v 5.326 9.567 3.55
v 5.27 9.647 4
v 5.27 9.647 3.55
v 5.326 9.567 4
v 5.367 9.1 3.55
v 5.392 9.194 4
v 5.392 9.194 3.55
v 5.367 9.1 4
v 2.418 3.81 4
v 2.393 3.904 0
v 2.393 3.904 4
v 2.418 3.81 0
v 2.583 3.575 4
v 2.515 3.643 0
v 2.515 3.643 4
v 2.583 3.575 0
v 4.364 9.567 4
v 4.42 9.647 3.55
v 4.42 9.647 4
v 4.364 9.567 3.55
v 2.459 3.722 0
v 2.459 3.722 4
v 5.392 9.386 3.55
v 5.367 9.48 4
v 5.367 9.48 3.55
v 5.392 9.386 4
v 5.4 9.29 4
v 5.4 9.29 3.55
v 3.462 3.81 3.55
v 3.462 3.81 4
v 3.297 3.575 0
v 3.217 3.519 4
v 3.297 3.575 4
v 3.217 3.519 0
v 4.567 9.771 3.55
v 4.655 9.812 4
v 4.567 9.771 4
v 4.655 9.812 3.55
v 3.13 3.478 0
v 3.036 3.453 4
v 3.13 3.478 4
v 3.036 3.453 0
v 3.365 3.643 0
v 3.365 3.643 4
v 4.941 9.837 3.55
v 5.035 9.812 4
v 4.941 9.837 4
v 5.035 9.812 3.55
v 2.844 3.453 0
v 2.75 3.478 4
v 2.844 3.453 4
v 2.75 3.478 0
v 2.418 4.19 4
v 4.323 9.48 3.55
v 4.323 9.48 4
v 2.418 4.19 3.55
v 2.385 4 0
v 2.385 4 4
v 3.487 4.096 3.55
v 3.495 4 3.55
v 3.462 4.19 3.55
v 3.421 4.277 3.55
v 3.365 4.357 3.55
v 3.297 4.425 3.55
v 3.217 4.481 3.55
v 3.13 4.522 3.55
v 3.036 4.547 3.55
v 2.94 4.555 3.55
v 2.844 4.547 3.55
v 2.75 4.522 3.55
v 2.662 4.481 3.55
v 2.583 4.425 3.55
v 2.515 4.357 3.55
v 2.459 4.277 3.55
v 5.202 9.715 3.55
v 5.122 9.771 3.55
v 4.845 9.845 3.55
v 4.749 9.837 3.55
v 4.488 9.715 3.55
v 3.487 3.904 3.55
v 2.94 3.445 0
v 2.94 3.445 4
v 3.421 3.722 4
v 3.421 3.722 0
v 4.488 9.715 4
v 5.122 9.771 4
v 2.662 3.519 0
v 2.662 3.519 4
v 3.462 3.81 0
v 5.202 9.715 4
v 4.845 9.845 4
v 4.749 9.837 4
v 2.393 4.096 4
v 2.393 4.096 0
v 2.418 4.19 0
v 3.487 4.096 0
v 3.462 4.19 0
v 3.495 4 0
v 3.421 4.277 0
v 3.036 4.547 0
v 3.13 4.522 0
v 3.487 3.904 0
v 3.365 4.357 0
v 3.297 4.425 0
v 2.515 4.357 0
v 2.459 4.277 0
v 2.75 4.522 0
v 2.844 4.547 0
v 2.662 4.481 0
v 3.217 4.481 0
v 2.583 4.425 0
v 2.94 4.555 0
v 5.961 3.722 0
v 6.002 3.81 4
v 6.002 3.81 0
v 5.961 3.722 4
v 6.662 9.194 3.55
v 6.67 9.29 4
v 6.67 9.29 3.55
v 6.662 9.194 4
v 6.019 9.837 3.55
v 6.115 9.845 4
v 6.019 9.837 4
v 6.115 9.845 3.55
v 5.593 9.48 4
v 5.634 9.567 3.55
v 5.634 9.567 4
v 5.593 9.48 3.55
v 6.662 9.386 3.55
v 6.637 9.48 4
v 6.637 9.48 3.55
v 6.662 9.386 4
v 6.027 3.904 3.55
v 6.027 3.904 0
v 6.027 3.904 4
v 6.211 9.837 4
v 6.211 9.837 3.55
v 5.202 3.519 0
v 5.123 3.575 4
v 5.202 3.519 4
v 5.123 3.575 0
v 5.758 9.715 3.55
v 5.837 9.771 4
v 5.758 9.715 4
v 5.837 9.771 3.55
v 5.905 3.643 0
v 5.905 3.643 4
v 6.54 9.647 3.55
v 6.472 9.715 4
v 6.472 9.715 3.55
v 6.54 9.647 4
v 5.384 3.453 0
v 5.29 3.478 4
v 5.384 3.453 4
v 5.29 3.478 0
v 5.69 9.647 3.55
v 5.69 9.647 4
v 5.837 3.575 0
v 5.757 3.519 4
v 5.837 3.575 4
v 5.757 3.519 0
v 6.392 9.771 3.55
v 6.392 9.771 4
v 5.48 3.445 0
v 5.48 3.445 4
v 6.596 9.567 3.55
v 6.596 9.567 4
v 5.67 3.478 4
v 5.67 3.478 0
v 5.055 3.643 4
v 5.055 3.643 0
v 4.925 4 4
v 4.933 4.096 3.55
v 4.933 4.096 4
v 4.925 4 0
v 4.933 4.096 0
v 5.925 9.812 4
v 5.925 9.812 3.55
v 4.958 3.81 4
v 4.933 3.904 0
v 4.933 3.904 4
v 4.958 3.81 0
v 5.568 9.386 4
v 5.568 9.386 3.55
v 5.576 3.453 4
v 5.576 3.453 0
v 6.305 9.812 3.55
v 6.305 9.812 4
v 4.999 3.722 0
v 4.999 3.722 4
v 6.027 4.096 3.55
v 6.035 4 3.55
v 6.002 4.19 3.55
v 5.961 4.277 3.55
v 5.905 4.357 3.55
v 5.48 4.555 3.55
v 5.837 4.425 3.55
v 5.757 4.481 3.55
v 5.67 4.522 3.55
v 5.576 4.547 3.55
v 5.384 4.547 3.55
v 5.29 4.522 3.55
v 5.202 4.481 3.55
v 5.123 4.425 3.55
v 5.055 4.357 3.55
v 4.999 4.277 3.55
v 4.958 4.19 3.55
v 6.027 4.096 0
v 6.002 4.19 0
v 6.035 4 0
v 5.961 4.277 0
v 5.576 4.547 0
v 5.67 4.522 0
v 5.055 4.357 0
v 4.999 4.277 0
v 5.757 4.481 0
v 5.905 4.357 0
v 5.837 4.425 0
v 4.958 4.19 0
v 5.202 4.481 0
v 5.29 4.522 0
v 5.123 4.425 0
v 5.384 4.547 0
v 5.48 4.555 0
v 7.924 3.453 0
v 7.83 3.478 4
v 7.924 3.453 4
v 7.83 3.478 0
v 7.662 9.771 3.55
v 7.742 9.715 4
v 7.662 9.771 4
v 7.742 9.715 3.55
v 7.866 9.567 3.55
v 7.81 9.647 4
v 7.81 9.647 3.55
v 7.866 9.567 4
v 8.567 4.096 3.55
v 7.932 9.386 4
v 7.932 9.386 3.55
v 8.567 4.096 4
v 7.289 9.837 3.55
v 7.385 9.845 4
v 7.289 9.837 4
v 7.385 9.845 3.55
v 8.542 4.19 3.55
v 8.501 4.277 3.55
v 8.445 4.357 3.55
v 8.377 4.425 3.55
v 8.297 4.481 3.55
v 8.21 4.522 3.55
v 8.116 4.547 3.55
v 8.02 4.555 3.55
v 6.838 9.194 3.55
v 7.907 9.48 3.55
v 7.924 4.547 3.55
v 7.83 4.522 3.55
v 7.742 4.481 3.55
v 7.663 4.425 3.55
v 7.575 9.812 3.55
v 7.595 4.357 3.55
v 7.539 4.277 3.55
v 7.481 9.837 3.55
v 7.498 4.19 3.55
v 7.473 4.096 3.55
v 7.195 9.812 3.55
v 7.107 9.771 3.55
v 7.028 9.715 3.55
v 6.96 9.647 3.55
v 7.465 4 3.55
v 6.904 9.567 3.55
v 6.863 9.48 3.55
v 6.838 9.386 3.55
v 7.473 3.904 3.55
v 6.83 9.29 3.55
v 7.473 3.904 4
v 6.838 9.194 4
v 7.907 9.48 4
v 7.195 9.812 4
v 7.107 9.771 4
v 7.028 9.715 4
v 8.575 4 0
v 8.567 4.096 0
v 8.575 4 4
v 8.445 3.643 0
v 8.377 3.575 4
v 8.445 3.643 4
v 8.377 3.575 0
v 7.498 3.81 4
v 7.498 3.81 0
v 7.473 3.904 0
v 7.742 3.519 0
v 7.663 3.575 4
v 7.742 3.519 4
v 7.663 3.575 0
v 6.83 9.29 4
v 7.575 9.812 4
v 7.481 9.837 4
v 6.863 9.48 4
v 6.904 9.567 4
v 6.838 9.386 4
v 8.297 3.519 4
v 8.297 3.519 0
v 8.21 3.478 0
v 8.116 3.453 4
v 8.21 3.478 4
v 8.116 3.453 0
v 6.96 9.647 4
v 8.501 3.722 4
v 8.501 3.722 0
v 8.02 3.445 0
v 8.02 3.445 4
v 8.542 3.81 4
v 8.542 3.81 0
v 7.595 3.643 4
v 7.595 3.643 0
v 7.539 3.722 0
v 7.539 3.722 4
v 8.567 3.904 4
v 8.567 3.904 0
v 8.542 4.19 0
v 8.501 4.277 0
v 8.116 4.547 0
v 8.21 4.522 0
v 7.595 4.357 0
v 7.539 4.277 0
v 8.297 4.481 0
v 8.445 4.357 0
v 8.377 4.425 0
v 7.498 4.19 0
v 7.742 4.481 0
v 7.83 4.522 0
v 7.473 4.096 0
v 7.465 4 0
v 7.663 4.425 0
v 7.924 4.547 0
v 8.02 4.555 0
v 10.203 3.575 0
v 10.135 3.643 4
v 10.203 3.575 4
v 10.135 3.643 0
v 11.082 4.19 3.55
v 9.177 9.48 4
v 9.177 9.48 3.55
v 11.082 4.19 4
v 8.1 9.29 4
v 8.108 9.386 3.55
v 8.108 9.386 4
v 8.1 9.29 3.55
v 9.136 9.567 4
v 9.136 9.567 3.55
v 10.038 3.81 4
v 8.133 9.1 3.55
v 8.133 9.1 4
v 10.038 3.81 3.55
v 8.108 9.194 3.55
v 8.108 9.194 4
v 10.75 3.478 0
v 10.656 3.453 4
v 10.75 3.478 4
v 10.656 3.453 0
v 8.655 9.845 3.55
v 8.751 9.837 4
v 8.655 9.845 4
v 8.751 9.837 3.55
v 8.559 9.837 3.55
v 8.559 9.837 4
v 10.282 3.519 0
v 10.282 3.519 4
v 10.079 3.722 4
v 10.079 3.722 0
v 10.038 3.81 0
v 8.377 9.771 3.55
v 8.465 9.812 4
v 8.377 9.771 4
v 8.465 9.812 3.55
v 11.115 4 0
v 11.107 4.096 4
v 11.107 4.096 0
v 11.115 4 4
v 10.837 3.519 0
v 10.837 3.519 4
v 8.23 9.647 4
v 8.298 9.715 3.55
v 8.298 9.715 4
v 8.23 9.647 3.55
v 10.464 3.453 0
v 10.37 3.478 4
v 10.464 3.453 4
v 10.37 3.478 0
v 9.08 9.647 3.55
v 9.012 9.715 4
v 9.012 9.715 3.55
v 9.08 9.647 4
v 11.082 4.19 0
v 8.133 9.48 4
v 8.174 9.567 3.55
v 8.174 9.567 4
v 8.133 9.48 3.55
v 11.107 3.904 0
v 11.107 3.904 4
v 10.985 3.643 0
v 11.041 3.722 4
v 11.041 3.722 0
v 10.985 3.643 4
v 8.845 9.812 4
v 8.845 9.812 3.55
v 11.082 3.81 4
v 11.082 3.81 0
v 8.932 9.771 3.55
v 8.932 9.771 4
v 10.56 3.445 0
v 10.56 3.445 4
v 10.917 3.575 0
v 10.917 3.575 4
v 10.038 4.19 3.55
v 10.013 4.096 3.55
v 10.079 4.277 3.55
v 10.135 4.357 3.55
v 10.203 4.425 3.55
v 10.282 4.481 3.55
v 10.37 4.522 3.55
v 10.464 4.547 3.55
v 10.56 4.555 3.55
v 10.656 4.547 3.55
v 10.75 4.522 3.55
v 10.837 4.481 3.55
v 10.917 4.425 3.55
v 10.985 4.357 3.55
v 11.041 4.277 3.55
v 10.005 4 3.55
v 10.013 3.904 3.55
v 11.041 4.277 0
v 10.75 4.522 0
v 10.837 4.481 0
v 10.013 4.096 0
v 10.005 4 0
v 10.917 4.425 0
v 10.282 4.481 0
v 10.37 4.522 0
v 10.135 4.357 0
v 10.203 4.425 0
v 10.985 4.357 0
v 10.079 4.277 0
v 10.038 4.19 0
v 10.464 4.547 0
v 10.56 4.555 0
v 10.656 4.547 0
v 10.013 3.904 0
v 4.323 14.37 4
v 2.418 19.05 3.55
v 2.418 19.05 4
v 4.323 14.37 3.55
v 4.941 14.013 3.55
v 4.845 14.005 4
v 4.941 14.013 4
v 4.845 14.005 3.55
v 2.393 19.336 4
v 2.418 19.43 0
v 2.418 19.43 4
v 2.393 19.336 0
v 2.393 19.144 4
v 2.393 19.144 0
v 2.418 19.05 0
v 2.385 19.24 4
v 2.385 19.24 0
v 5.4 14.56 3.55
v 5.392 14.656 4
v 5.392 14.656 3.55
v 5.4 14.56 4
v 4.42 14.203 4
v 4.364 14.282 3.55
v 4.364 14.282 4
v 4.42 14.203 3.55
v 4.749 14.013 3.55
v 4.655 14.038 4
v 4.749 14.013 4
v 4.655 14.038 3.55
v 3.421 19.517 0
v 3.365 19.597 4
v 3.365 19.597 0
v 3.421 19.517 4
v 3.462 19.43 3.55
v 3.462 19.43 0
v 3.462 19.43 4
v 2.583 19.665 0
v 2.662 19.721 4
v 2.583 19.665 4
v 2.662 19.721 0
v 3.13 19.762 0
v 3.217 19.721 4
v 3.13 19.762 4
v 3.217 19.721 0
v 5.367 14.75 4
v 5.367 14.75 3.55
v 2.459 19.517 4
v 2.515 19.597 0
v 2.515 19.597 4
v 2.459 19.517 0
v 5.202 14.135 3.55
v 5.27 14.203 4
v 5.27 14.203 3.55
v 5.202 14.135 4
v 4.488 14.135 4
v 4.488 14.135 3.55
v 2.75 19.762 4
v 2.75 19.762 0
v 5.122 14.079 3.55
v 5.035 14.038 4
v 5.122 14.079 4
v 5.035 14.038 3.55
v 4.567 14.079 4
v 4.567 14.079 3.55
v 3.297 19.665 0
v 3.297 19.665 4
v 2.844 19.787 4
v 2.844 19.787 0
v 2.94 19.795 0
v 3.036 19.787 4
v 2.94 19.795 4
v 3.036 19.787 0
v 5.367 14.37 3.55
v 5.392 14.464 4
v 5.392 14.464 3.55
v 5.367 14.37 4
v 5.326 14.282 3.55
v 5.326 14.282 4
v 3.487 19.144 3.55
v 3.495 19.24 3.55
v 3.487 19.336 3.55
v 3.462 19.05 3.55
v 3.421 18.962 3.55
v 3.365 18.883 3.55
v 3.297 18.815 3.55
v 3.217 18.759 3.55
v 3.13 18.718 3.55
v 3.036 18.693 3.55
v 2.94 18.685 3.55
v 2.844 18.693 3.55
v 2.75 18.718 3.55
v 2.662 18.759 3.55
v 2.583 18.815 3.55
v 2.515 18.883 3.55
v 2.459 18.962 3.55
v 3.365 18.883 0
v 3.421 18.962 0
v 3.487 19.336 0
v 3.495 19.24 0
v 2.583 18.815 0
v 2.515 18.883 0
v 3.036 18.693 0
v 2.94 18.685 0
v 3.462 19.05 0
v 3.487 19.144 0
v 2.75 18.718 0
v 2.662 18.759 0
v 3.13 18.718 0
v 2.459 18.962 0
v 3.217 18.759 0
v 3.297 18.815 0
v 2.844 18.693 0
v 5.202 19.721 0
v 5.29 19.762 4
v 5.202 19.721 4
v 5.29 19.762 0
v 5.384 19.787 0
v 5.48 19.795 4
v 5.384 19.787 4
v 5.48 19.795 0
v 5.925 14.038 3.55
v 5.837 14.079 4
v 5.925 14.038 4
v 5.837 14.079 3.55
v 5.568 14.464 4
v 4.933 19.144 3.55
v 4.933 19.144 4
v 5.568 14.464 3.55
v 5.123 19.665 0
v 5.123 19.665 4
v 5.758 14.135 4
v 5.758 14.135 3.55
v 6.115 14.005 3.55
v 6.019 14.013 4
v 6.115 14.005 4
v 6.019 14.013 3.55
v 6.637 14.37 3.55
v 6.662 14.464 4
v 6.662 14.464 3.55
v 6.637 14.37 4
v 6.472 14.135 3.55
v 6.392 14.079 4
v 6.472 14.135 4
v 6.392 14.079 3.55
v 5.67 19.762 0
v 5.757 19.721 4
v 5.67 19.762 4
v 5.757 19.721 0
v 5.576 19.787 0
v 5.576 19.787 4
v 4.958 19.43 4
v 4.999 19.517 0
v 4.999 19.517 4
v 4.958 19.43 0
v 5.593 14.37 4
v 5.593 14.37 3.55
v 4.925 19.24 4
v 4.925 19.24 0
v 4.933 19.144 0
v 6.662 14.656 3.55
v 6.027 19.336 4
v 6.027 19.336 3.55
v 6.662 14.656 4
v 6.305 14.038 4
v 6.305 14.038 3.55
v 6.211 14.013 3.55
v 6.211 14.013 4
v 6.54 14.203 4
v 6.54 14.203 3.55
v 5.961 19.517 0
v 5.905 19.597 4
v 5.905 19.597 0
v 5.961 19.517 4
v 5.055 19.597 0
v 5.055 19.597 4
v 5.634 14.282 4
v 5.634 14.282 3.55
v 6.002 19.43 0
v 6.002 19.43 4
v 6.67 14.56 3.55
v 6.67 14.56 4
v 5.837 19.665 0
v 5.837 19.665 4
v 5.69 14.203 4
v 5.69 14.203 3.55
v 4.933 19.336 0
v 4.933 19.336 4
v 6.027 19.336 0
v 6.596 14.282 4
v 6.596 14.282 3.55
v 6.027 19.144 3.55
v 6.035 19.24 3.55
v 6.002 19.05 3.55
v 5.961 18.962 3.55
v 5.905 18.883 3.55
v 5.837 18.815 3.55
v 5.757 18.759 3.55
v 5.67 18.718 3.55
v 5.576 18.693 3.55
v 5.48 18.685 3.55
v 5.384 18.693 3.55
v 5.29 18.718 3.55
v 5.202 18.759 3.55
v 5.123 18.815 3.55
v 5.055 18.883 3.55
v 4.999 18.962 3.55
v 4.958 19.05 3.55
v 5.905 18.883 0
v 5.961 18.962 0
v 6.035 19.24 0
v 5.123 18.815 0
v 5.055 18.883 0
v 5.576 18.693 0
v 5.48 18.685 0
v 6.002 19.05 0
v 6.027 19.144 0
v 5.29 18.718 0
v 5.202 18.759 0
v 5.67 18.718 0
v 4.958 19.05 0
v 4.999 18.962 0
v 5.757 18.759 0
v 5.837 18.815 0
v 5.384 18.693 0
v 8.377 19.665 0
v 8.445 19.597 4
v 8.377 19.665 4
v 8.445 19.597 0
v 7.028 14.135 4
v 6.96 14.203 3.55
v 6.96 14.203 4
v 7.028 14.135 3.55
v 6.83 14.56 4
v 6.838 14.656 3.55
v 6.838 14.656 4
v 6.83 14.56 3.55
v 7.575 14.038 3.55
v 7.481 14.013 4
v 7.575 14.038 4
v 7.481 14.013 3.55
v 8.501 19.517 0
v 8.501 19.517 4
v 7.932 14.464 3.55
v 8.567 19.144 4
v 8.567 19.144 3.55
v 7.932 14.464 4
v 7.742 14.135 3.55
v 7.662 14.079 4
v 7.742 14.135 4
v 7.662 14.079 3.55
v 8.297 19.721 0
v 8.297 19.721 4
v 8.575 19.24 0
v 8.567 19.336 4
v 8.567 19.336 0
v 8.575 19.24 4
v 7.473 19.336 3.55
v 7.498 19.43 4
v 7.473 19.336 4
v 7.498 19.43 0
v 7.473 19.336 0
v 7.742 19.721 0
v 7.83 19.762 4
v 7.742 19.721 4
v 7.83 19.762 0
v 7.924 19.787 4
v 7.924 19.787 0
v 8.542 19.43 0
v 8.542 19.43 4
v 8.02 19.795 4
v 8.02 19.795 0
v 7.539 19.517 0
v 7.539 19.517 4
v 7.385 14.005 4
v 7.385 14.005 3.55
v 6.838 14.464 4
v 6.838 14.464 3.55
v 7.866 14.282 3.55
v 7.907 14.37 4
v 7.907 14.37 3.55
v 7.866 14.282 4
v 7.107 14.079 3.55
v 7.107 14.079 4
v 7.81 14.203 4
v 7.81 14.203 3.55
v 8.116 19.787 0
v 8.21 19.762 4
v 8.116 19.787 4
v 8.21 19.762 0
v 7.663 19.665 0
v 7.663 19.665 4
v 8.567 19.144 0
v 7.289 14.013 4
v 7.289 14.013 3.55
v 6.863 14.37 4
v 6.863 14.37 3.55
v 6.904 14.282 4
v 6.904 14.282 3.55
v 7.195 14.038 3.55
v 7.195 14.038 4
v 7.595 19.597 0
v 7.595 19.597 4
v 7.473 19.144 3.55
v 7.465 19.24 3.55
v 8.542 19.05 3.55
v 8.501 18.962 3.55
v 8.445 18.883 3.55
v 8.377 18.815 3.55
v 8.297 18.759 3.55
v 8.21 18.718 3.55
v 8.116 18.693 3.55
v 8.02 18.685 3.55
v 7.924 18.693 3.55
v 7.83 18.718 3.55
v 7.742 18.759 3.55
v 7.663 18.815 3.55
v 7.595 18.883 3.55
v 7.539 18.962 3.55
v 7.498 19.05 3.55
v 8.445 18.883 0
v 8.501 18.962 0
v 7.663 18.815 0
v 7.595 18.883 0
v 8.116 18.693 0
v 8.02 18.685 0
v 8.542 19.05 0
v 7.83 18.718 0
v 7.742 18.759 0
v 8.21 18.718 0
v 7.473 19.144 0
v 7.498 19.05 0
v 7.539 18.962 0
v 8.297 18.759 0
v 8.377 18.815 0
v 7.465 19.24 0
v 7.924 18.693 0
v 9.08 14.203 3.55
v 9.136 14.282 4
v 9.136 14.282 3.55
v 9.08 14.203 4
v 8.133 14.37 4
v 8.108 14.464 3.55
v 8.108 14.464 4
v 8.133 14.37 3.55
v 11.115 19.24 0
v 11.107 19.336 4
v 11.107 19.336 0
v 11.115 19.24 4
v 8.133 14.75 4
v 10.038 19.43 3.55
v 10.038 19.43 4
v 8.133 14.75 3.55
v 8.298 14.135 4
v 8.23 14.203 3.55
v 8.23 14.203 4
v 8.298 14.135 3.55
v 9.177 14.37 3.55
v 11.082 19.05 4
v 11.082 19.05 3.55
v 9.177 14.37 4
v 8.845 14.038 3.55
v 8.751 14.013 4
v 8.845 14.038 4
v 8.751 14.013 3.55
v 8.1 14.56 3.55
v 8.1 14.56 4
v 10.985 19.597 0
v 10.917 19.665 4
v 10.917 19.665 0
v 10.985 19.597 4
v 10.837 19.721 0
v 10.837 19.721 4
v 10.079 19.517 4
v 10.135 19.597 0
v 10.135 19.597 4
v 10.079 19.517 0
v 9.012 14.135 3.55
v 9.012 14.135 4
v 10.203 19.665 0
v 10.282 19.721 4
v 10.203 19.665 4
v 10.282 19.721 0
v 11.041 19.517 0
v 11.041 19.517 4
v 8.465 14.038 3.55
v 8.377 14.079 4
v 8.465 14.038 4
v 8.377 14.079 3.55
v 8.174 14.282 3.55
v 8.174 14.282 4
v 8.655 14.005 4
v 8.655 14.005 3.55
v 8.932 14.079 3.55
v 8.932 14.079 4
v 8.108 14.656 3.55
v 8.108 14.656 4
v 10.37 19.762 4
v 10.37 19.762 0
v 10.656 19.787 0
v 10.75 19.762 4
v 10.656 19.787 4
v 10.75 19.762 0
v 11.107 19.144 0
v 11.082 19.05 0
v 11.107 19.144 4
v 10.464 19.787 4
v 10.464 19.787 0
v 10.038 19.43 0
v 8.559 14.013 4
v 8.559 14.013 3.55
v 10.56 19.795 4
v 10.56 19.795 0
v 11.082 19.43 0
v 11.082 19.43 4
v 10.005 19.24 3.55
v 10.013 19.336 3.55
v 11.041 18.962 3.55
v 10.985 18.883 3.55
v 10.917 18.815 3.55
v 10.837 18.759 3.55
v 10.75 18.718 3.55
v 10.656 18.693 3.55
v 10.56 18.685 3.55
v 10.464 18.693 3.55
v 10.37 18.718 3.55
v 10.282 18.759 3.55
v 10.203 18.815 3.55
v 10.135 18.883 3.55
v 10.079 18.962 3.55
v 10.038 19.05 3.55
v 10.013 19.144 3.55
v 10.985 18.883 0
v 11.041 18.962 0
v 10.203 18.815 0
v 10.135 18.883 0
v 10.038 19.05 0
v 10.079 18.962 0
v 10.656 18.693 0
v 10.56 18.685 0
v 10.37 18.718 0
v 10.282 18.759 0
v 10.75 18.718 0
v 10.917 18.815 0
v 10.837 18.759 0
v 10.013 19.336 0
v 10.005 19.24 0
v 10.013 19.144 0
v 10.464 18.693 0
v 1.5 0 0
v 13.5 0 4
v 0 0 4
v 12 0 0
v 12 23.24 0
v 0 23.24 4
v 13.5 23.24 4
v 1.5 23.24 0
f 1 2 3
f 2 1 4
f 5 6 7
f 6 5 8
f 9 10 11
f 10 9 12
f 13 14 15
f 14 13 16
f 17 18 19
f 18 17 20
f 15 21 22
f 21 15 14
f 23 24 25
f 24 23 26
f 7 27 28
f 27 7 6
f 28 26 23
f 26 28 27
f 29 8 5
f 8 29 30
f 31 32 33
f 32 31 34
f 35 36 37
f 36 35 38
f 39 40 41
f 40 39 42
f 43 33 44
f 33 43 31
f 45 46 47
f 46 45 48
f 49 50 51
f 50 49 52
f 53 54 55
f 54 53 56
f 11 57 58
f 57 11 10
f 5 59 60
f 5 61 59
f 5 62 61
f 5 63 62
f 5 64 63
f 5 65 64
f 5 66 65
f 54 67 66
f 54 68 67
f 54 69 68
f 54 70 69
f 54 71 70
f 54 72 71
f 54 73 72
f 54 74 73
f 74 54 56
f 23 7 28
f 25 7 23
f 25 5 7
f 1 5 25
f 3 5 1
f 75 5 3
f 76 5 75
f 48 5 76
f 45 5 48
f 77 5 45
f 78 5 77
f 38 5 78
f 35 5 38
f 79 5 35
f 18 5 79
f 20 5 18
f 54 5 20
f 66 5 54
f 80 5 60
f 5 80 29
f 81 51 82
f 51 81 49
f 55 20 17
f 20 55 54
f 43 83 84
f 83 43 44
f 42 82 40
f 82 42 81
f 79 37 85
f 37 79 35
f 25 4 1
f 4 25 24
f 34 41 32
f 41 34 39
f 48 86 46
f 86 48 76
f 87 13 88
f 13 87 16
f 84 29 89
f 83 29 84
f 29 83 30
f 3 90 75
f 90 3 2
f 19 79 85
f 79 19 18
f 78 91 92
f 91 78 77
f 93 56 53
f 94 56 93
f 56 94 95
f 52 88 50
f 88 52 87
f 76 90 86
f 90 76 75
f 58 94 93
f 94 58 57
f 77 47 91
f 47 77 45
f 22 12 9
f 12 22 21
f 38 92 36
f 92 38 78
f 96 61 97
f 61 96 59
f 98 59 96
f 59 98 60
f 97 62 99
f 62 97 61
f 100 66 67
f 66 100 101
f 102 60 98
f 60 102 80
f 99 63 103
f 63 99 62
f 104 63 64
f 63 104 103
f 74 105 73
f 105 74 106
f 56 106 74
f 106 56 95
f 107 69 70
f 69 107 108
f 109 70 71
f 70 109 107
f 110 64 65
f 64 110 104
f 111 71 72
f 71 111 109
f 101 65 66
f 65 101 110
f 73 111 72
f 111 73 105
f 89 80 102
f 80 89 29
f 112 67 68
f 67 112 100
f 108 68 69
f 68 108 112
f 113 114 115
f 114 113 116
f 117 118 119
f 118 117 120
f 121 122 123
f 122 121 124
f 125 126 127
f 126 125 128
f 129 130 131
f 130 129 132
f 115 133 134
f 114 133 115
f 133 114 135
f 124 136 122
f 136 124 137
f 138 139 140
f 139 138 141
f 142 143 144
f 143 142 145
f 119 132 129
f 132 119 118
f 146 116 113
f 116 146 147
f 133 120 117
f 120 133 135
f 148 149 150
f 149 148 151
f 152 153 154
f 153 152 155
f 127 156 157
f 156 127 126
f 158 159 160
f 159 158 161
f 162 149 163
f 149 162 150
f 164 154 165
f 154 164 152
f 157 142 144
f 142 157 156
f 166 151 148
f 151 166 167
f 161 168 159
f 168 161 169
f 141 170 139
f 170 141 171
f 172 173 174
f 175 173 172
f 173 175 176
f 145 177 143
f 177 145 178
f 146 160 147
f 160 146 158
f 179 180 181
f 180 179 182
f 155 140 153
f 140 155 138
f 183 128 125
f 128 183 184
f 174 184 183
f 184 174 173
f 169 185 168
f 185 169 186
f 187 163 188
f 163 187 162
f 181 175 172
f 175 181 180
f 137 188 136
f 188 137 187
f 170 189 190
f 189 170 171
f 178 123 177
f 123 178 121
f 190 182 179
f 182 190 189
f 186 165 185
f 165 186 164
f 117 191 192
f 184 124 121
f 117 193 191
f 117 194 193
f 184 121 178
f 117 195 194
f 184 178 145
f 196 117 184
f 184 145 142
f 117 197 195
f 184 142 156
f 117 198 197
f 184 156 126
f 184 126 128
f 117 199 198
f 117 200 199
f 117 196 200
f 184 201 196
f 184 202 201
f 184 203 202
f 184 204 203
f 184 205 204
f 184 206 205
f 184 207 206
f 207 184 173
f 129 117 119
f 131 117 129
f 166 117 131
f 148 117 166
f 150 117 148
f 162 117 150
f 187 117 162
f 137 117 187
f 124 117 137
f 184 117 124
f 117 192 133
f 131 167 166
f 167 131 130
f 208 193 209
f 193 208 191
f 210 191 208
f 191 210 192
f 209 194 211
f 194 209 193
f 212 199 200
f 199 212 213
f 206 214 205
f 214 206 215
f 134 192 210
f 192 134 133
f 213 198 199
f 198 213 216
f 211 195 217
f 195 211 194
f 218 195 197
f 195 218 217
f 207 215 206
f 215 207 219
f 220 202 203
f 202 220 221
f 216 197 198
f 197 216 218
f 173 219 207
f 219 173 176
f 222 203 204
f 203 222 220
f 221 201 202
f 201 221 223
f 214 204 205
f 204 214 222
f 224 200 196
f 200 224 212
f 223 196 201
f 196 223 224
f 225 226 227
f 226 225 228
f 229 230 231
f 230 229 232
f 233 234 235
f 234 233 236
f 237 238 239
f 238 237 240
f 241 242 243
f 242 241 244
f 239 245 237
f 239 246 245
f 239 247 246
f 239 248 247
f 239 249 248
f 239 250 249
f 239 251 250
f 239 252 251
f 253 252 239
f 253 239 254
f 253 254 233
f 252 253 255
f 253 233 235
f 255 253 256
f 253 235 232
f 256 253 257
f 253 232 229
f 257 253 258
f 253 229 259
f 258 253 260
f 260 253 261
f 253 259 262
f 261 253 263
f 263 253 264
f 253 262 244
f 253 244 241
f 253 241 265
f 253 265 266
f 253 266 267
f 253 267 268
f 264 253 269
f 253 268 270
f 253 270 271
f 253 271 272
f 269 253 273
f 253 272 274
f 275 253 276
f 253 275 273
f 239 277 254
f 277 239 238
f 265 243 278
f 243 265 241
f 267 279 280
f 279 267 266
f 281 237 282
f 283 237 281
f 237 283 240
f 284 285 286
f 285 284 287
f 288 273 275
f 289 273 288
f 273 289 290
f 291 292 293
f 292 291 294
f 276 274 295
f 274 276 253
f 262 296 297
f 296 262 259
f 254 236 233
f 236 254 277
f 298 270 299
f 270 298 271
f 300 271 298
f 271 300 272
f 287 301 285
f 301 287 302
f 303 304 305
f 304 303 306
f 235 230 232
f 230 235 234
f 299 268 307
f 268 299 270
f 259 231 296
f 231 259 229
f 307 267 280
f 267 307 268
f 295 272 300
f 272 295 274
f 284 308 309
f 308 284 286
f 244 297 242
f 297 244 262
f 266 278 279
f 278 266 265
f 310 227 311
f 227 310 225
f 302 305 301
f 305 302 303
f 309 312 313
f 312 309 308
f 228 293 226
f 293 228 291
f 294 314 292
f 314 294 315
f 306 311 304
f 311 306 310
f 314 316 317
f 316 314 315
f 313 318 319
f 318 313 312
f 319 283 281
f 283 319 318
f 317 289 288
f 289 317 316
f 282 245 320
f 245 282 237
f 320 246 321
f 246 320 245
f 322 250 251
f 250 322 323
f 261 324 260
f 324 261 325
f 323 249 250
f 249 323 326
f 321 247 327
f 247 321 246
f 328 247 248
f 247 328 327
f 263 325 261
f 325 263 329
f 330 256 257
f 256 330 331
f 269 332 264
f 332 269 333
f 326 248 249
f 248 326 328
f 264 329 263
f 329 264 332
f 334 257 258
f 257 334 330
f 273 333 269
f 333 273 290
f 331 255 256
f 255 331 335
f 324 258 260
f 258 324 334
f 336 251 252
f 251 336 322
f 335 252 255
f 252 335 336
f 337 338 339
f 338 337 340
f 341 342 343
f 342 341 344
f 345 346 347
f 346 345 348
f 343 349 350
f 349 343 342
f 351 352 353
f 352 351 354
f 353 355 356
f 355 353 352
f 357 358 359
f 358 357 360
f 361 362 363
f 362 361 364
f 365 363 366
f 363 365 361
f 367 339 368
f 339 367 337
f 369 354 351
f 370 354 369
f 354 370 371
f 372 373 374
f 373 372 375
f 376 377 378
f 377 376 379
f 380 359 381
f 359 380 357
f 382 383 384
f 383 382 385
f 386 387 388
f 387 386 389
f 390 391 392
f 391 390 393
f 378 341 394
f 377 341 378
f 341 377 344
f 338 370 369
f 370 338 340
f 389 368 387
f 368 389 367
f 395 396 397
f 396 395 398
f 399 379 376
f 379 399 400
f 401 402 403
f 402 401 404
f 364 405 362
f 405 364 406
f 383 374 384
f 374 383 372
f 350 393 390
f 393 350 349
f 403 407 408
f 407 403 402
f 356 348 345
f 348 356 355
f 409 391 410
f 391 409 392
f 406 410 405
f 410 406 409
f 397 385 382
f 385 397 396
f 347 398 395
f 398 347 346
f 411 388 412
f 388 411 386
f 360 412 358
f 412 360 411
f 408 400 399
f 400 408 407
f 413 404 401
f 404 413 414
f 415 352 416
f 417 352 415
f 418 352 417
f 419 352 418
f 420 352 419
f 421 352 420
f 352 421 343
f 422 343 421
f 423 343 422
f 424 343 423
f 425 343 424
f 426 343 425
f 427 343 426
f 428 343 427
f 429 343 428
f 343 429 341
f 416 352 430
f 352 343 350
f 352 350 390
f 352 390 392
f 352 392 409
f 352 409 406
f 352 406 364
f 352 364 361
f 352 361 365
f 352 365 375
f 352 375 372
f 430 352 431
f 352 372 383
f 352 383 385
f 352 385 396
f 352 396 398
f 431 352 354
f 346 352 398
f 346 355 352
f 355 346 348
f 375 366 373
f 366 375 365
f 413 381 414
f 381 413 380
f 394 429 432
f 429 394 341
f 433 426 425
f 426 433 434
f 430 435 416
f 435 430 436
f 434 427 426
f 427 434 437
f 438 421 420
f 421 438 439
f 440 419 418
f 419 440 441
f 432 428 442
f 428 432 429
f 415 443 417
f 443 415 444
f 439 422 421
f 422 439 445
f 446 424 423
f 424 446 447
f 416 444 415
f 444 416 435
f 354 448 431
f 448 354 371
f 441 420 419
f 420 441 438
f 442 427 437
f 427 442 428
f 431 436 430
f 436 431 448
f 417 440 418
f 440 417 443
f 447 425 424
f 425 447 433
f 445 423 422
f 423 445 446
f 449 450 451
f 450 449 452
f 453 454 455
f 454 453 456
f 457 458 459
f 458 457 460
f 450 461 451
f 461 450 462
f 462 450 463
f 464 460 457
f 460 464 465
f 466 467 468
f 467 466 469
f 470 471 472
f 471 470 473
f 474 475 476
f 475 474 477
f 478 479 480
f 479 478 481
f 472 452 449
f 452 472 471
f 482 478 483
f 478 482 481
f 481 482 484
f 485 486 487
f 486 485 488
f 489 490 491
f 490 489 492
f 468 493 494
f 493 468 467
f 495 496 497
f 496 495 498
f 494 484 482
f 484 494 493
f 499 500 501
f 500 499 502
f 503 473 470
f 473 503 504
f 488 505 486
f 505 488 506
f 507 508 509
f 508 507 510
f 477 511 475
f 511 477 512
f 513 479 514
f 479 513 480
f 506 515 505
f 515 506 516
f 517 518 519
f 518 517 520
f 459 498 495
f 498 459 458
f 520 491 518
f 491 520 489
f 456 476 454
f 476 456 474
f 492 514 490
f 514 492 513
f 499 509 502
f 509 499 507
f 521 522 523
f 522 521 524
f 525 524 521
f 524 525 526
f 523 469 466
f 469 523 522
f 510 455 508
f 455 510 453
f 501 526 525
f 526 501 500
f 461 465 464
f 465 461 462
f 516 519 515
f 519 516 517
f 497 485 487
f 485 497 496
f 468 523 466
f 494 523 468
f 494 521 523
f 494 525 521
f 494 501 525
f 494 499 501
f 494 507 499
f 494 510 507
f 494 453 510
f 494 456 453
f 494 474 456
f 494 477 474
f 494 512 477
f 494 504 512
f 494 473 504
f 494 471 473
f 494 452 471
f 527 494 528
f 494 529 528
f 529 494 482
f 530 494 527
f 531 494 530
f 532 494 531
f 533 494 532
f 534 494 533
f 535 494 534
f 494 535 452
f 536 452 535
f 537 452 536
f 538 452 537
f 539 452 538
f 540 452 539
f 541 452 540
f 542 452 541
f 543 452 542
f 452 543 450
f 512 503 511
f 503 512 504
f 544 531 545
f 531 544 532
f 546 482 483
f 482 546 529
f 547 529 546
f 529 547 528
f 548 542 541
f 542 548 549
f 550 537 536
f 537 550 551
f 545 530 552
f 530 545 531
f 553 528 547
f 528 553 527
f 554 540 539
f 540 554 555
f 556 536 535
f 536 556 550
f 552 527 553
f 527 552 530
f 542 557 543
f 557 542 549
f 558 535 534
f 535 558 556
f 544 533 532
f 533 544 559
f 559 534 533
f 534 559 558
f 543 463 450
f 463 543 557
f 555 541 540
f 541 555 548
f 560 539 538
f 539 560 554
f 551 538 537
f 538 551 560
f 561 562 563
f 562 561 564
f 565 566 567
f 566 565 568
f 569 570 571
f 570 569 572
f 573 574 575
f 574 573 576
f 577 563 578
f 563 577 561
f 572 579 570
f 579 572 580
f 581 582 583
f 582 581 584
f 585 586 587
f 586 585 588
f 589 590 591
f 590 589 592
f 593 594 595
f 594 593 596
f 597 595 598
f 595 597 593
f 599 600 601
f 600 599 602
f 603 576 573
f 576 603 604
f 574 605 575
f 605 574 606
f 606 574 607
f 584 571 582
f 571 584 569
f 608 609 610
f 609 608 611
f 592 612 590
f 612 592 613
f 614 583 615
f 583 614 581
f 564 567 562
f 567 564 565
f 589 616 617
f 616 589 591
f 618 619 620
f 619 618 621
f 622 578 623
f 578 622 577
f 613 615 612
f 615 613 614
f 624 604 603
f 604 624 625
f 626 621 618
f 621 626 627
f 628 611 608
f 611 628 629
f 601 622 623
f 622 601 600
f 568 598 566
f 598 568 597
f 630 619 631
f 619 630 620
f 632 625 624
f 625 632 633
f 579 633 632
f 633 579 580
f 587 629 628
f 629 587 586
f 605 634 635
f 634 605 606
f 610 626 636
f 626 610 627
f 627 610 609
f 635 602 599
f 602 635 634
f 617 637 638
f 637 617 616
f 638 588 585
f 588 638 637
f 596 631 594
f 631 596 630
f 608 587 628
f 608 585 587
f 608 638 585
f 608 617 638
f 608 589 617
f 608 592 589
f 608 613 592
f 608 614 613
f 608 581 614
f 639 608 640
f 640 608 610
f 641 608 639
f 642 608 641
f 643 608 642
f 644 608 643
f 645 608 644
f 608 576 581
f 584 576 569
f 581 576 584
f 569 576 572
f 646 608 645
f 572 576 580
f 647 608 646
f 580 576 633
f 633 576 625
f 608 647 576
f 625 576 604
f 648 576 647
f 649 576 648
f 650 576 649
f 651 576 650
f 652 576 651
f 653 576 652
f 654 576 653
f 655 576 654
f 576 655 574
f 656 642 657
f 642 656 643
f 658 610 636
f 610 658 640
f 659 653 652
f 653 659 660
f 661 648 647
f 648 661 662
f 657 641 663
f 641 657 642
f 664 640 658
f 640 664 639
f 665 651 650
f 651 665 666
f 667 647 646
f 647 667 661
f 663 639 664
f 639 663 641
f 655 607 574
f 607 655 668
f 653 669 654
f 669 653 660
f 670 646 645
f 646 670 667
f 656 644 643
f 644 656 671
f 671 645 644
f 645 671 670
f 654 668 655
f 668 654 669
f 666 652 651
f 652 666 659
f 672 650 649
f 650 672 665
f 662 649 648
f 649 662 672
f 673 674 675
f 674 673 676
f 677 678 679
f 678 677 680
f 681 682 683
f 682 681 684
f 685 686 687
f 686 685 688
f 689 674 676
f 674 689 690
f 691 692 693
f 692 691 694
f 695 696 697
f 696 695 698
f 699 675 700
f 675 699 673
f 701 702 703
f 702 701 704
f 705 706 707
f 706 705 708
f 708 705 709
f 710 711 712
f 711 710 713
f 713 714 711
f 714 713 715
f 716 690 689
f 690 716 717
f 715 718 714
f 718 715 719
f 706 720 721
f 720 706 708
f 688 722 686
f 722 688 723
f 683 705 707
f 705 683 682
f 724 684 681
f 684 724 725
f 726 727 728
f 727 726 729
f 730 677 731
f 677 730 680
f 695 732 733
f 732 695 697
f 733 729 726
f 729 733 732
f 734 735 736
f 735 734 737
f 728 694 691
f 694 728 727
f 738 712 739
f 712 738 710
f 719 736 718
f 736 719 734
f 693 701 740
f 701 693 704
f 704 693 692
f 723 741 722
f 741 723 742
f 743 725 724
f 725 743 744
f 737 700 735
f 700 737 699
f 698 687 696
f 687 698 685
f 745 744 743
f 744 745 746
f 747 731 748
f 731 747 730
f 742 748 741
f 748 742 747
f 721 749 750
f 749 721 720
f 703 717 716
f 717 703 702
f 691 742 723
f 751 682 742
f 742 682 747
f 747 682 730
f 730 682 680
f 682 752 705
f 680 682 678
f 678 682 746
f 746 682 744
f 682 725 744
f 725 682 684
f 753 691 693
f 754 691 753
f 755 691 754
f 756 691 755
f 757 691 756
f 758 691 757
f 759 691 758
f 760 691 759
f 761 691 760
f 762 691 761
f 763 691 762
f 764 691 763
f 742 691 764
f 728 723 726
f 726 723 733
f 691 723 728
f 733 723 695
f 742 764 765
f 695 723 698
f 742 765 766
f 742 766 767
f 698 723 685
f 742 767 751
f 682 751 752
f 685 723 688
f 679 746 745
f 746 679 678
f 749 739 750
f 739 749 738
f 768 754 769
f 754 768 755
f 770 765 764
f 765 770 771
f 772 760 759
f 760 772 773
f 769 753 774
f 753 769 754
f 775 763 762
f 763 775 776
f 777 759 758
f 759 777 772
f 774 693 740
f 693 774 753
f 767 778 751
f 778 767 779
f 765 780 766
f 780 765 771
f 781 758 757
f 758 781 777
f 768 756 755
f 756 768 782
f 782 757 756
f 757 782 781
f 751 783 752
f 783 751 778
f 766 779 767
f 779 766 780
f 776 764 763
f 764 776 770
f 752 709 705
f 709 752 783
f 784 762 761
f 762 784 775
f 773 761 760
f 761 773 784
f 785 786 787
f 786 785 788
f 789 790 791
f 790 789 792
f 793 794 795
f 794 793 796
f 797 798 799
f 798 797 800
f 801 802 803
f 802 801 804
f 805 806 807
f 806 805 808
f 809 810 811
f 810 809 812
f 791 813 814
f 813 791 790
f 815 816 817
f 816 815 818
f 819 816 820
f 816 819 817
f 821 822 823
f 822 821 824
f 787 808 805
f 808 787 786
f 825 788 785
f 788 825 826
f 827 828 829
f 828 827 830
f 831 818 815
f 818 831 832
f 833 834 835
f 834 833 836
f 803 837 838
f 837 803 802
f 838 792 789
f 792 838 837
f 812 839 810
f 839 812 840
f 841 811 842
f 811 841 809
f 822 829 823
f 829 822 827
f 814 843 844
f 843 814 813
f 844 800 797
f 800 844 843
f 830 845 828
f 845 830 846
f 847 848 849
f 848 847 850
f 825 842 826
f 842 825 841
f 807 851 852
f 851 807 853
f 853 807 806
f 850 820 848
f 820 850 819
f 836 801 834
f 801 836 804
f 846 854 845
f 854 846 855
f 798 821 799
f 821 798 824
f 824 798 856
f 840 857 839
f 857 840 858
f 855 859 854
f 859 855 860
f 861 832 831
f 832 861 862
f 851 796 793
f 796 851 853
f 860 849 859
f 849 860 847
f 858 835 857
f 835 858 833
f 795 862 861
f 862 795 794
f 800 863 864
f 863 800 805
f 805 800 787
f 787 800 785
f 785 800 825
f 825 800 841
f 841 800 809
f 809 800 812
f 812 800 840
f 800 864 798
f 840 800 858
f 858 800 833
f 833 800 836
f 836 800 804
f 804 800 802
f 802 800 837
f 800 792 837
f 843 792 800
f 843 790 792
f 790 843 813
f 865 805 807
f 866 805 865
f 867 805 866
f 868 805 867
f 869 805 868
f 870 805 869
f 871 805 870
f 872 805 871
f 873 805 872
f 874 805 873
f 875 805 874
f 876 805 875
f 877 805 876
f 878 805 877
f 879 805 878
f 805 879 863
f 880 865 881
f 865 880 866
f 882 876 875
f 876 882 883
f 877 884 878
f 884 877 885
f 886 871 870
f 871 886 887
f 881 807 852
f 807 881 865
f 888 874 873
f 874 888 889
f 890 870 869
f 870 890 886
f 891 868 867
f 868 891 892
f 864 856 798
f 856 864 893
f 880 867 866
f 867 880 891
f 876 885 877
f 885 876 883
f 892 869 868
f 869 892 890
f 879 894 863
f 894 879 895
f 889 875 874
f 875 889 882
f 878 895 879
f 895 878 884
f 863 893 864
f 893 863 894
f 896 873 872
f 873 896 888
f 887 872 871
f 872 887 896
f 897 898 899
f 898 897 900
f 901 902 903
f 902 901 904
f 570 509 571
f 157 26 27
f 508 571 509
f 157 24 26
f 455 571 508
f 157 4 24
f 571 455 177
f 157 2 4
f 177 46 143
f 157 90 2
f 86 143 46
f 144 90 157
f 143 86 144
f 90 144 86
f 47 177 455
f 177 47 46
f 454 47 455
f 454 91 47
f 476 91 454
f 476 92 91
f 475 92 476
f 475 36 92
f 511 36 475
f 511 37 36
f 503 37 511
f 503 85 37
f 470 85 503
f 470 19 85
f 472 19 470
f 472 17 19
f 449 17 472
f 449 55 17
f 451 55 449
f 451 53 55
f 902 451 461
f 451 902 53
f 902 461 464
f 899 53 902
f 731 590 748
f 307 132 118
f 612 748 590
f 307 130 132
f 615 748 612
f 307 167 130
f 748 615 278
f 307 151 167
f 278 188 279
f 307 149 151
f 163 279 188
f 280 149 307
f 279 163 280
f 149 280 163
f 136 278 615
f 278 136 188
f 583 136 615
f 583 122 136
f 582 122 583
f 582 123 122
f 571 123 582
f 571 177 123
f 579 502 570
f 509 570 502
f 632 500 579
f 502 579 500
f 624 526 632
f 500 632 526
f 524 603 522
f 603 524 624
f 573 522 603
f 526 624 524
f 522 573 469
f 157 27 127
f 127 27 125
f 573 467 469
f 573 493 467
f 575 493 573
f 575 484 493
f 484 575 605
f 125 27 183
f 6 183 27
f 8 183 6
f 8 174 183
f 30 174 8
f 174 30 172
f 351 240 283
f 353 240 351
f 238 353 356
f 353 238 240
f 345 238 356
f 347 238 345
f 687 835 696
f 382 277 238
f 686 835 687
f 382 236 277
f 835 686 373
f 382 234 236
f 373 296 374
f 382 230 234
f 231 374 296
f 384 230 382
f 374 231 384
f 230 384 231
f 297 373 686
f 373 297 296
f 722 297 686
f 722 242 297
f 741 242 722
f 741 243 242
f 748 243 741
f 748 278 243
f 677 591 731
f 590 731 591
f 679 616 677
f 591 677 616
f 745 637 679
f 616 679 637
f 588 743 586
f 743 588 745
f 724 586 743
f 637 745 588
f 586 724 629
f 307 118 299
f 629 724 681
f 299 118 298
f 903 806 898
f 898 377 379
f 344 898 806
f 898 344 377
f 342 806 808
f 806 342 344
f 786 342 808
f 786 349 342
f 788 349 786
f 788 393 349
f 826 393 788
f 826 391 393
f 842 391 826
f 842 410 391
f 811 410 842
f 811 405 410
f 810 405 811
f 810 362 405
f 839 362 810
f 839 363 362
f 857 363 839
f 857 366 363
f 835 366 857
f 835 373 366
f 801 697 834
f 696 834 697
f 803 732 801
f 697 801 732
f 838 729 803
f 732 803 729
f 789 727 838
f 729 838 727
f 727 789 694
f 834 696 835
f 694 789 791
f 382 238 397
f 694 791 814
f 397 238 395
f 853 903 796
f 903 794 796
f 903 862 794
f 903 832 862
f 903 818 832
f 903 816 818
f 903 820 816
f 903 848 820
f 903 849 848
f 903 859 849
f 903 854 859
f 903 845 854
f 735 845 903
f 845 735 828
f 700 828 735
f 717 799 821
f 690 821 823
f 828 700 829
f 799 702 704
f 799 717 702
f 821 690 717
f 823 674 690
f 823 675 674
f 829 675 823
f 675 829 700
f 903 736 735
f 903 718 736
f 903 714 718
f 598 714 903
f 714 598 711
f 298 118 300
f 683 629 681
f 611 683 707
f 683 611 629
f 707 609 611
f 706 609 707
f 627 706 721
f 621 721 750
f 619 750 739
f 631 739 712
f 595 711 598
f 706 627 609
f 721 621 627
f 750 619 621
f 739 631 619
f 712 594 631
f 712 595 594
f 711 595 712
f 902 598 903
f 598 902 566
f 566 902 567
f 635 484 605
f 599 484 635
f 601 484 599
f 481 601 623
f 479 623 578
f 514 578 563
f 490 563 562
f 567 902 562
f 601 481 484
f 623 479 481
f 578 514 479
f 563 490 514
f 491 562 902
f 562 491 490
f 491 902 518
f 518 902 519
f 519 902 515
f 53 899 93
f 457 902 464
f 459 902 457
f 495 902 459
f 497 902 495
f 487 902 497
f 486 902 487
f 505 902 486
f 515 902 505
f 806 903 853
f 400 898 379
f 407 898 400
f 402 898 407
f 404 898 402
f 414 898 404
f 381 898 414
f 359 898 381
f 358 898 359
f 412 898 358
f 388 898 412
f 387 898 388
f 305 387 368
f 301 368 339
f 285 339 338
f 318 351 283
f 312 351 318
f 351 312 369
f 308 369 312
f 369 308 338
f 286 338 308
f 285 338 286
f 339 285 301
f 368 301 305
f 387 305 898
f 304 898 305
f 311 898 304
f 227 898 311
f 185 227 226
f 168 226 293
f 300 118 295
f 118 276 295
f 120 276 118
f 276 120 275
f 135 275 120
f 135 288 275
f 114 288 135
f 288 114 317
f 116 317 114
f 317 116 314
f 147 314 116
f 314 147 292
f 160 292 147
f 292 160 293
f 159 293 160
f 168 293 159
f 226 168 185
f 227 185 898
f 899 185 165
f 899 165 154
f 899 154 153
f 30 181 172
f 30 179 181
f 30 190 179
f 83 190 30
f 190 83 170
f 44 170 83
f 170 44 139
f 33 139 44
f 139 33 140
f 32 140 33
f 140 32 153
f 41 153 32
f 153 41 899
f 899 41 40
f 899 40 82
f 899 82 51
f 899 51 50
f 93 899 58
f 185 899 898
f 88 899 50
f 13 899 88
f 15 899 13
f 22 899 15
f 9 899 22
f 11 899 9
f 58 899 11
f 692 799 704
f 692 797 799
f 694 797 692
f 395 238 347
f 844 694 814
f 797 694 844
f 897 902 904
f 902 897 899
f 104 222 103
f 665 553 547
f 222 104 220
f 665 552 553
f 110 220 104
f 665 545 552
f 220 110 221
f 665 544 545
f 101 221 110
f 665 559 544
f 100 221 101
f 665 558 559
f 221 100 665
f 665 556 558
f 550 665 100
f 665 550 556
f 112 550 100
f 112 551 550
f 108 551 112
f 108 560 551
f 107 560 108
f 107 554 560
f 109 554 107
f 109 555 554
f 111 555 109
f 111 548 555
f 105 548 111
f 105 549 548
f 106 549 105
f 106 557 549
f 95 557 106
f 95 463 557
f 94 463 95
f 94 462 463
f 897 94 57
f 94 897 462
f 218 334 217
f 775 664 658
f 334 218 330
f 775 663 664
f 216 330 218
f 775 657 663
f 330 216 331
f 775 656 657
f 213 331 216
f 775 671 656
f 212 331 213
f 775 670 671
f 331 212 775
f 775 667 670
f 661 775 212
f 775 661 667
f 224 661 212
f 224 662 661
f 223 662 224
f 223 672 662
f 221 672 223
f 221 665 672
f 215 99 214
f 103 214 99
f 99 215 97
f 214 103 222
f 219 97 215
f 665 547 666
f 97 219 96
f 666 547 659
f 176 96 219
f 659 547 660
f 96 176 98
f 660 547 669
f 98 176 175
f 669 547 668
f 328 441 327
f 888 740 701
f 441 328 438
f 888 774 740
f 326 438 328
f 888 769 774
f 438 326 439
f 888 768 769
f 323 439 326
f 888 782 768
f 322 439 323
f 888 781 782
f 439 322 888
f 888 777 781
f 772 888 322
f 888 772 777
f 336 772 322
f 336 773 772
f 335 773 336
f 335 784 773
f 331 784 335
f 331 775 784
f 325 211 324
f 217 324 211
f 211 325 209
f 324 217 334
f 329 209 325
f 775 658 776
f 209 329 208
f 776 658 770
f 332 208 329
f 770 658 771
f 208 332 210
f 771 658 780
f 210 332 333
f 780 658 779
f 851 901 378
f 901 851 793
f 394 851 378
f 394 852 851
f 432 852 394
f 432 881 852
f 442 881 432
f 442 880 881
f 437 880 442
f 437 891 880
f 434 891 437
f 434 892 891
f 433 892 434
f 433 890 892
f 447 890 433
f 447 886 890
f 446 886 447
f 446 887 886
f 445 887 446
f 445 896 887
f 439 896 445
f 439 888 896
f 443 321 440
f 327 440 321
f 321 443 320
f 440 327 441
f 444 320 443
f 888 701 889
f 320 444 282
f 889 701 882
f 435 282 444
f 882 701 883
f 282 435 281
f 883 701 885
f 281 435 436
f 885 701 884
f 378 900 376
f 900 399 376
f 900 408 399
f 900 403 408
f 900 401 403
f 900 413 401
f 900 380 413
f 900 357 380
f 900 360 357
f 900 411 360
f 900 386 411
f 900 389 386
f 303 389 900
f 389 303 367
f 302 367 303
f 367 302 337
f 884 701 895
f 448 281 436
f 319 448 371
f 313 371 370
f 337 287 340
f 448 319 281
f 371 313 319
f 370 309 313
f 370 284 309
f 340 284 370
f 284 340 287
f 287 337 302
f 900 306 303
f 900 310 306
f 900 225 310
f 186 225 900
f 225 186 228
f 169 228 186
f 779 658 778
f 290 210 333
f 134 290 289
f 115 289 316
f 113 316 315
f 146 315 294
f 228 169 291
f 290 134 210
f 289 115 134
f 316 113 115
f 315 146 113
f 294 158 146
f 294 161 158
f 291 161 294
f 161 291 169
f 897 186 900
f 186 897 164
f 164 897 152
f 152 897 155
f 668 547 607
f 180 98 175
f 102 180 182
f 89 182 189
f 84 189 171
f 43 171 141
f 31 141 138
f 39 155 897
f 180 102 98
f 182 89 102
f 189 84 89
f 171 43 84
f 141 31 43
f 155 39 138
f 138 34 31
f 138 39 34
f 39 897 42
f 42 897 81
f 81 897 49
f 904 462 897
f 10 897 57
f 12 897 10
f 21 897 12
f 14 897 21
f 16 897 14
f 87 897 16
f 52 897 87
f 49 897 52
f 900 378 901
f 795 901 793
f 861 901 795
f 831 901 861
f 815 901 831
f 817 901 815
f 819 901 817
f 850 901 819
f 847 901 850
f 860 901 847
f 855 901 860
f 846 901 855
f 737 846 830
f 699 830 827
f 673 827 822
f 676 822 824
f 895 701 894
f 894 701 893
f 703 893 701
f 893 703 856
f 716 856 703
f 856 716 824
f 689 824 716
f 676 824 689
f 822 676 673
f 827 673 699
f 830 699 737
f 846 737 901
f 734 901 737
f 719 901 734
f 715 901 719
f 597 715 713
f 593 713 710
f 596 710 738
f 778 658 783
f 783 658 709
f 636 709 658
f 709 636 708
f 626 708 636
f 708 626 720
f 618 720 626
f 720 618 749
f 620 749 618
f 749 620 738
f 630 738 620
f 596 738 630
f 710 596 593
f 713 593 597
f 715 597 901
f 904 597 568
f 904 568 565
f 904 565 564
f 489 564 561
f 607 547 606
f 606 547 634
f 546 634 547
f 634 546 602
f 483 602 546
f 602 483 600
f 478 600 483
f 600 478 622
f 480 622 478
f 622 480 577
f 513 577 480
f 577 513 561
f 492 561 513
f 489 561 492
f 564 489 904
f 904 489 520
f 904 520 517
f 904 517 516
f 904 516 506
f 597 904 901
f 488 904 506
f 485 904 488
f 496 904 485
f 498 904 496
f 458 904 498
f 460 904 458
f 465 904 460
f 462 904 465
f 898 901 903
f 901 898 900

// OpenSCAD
// must be even
numberOfPads = 8; 
padToPadAcrossChip = 5.27;
chipLength = 5;
pitch = 1.27;
breadboardPitch = 2.54;
breadboardSpacesAcross = 6;
baseThickness = 4;
margin = 4;
topThickness = 3;
snapMinimumThickness = 2;
snapInset = 1.5;
snapWidth = 8;
wireChannelDepth = 0.45; 
wireChannelWidth = 0.61;
wireThickness = 0.61;
tolerance = 0.25;

module dummy() {}

length = chipLength + 2*tolerance + 2*margin;
holeYSpacing = breadboardSpacesAcross * breadboardPitch;
width = holeYSpacing + 2*margin;
padsPerSide = numberOfPads / 2;
smdPin1X = length/2 - (padsPerSide-1)/2*pitch;
bbPin1X = length/2 - (padsPerSide-1)/2*breadboardPitch;

wireChannelWidth0 = wireChannelWidth + 2*tolerance;
nudge = 0.001;

module trace(smd,bb) {
    $fn = 36;
    translate([0,0,baseThickness-wireChannelDepth])
    hull() {
        translate(smd) cylinder(d=wireChannelWidth0,h=wireChannelDepth+nudge);
        translate(bb) cylinder(d=wireChannelWidth0,h=wireChannelDepth+nudge);        
    }
    translate([bb[0],bb[1],-nudge])
    cylinder(d=wireThickness+2*tolerance,h=baseThickness+2*nudge);
}

        


module base() {
    render(convexity=4)
    difference() {
        mirror([0,1,0])
        rotate([90,0,0])
        linear_extrude(height=width)
        polygon([[snapInset, 0], [length-snapInset, 0],
            [length, baseThickness], [0,baseThickness]]);
        for (side=[-1:2:1]) {
            smdPinY = width/2+side*padToPadAcrossChip/2+wireChannelWidth/2;
            bbPinY = width/2+side*holeYSpacing/2;
            for (i=[0:padsPerSide-1]) {
                trace([smdPin1X+i*pitch,smdPinY],[bbPin1X+i*breadboardPitch,bbPinY]);
            }
        }
    }
}

base();
